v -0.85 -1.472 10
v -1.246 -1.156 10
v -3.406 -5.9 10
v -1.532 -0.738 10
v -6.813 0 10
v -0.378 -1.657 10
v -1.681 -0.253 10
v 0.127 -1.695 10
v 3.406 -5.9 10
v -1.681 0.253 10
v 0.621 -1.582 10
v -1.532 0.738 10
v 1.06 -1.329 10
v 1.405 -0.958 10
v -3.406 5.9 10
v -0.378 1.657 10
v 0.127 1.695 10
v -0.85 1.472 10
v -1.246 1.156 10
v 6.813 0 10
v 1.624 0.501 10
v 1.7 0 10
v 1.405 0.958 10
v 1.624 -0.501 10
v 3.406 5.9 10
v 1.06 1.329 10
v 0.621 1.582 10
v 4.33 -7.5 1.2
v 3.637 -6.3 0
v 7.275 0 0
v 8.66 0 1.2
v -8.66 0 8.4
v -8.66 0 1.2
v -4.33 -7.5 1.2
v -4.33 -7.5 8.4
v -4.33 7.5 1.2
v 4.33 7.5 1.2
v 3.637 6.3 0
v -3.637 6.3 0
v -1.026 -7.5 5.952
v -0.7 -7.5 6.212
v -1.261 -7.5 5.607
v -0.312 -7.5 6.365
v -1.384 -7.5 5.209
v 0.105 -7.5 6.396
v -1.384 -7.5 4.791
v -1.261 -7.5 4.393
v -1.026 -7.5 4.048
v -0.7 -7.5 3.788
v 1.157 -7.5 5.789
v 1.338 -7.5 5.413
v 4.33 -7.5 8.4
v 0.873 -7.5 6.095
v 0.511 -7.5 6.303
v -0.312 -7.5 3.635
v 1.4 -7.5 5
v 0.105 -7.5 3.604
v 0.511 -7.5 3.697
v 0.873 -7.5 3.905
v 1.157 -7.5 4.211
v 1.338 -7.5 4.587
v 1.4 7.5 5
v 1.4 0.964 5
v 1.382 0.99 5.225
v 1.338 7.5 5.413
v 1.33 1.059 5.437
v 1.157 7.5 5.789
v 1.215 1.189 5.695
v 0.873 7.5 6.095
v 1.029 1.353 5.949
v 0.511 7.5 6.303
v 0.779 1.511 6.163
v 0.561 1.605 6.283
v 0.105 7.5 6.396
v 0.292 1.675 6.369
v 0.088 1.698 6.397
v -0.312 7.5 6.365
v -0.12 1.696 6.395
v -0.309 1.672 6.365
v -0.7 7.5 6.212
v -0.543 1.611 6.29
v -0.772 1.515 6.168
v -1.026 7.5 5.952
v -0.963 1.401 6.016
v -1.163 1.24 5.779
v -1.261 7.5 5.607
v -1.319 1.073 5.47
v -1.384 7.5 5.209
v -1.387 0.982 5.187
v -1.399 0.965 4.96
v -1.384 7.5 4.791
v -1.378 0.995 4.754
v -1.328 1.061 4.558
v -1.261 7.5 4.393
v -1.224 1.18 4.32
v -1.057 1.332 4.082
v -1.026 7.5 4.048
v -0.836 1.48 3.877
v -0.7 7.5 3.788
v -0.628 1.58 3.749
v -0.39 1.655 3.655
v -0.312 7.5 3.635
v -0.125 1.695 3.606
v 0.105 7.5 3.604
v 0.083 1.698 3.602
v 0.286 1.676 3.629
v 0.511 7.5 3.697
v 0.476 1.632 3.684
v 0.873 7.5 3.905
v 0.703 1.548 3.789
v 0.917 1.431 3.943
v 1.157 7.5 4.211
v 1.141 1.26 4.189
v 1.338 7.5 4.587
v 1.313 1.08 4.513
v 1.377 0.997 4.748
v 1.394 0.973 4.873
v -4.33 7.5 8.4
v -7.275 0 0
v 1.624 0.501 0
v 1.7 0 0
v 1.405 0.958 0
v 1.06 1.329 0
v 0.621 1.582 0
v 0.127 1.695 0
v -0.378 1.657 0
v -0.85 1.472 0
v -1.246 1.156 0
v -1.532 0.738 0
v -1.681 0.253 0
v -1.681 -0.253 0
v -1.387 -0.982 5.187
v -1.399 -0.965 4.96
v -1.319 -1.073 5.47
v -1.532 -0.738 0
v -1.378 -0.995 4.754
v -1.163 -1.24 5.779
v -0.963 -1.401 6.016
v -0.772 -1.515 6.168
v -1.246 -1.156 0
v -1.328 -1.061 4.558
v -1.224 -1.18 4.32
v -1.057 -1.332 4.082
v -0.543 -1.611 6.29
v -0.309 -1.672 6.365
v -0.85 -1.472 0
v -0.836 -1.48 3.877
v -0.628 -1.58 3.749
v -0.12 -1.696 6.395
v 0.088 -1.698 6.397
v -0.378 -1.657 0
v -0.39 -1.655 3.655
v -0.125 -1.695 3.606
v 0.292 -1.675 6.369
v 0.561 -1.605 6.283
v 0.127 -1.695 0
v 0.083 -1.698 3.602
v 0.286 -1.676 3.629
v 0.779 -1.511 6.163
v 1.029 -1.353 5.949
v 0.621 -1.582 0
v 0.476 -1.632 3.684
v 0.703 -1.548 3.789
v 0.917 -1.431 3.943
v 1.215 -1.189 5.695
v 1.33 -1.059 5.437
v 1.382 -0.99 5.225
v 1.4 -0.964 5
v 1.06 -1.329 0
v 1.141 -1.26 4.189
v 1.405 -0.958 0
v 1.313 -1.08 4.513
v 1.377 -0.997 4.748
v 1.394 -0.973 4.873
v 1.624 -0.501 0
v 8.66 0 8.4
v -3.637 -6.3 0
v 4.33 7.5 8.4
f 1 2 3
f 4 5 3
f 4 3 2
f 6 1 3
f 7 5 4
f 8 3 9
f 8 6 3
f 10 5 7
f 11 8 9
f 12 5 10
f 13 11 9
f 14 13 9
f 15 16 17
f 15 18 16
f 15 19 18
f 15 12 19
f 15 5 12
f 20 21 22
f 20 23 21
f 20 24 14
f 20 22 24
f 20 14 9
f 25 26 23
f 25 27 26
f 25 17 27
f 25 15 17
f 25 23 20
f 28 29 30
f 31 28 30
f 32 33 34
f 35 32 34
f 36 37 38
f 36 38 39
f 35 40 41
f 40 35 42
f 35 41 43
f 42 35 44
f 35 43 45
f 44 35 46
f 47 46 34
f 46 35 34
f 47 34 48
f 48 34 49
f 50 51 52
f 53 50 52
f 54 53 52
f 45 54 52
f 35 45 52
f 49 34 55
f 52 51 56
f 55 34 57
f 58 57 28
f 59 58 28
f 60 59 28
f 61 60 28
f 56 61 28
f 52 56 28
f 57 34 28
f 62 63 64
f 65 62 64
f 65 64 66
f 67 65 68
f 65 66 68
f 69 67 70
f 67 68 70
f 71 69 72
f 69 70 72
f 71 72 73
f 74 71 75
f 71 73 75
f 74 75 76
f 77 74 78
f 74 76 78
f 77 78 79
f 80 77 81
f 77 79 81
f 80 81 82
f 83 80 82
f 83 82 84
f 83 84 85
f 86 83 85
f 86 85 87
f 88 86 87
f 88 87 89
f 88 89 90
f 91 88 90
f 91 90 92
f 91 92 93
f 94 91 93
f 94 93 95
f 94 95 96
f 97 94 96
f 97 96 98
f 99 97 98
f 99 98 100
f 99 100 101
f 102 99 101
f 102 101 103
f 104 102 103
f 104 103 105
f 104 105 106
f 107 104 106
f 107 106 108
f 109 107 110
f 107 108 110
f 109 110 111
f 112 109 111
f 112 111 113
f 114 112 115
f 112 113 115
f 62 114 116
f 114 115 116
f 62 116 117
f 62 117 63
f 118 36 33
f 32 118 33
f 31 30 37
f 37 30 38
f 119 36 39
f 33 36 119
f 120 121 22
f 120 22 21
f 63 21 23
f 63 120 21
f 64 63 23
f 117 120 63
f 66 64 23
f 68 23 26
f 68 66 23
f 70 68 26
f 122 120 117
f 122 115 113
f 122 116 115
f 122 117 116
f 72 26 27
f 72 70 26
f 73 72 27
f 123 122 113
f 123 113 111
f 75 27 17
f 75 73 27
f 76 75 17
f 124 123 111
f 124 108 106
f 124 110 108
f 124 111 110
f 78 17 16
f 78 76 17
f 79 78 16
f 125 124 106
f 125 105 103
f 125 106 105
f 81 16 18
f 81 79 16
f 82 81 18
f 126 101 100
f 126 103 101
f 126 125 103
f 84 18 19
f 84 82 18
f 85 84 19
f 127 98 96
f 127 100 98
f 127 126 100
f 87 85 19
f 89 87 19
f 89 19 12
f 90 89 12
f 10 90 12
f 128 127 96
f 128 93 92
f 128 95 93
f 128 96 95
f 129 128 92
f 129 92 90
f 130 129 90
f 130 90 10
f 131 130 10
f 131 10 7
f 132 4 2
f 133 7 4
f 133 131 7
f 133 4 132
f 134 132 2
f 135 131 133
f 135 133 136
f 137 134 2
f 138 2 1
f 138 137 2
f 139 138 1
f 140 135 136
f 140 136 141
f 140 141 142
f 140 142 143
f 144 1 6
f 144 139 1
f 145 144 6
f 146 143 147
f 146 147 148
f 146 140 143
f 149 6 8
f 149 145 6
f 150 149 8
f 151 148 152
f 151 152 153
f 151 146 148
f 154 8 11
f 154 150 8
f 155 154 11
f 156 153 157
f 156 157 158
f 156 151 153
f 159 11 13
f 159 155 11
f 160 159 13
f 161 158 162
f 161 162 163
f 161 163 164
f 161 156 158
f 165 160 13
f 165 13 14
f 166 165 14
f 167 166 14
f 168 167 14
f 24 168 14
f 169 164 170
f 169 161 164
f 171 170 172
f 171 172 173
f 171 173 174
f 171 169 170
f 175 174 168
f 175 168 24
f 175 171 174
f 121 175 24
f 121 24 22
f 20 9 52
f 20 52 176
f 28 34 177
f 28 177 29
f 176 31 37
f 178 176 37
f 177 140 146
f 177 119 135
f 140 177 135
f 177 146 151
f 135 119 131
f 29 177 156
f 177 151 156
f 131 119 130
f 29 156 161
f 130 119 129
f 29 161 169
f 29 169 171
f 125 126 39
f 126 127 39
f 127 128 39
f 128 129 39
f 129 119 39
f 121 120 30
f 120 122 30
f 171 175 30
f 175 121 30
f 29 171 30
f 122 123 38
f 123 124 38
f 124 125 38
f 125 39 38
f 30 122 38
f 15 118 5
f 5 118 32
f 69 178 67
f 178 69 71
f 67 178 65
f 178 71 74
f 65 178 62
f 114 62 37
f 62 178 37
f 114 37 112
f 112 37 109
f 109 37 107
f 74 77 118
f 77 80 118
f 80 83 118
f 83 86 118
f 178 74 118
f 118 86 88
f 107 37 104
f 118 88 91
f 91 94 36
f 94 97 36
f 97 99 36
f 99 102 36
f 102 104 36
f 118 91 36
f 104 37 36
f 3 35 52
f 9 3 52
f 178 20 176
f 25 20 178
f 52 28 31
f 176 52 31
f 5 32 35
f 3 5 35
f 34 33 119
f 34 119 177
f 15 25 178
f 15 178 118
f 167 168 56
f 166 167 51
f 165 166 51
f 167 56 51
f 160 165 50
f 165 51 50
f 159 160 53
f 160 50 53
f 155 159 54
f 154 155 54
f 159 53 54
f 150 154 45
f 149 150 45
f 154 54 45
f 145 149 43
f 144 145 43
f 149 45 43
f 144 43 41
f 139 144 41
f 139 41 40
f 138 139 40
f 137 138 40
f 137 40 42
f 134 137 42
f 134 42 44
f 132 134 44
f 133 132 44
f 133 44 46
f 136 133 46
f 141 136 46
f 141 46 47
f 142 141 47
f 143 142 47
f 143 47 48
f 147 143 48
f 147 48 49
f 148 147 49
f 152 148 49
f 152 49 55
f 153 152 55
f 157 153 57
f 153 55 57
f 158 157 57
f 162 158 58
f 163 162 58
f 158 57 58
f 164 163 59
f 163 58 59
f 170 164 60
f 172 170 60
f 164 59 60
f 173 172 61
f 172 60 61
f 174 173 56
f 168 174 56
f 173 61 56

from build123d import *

# Parameters (mm, degrees)
SKETCH1_R           = 1.7
BOSS_EXTRUDE1_DEPTH = 10
SKETCH2_R           = 1.4
CUT_EXTRUDE1_DEPTH  = 16
CHAMFER1_SIZE       = 1.6
CHAMFER2_SIZE       = 1.2


with BuildPart() as part:
    # Sketch1 → Boss-Extrude1 (new body)
    with BuildSketch(Plane.XY):
        Polygon((8.660254038, 0), (4.330127019, 7.5), (-4.330127019, 7.5), (-8.660254038, 0), (-4.330127019, -7.5), (4.330127019, -7.5), align=None)
        Circle(SKETCH1_R, mode=Mode.SUBTRACT)
    extrude(amount=BOSS_EXTRUDE1_DEPTH)

    # Sketch2 → Cut-Extrude1 (cut, through all)
    with BuildSketch(Plane.XZ.offset(7.5)):
        with Locations((0, 5)):
            Circle(SKETCH2_R)
    extrude(amount=-CUT_EXTRUDE1_DEPTH, mode=Mode.SUBTRACT)

    # Chamfer1
    chamfer1_edges = [part.edges().sort_by_distance(p)[0] for p in [
        (0, 7.5, 10),
        (-6.495190528, 3.75, 10),
        (-6.495190528, -3.75, 10),
        (0, -7.5, 10),
        (6.495190528, -3.75, 10),
        (6.495190528, 3.75, 10),
    ]]
    chamfer(chamfer1_edges, length=CHAMFER1_SIZE)

    # Chamfer2
    chamfer2_edges = [part.edges().sort_by_distance(p)[0] for p in [
        (0, -7.5, 0),
        (-6.495190528, -3.75, 0),
        (-6.495190528, 3.75, 0),
        (0, 7.5, 0),
        (6.495190528, 3.75, 0),
        (6.495190528, -3.75, 0),
    ]]
    chamfer(chamfer2_edges, length=CHAMFER2_SIZE)


solid = part.part
